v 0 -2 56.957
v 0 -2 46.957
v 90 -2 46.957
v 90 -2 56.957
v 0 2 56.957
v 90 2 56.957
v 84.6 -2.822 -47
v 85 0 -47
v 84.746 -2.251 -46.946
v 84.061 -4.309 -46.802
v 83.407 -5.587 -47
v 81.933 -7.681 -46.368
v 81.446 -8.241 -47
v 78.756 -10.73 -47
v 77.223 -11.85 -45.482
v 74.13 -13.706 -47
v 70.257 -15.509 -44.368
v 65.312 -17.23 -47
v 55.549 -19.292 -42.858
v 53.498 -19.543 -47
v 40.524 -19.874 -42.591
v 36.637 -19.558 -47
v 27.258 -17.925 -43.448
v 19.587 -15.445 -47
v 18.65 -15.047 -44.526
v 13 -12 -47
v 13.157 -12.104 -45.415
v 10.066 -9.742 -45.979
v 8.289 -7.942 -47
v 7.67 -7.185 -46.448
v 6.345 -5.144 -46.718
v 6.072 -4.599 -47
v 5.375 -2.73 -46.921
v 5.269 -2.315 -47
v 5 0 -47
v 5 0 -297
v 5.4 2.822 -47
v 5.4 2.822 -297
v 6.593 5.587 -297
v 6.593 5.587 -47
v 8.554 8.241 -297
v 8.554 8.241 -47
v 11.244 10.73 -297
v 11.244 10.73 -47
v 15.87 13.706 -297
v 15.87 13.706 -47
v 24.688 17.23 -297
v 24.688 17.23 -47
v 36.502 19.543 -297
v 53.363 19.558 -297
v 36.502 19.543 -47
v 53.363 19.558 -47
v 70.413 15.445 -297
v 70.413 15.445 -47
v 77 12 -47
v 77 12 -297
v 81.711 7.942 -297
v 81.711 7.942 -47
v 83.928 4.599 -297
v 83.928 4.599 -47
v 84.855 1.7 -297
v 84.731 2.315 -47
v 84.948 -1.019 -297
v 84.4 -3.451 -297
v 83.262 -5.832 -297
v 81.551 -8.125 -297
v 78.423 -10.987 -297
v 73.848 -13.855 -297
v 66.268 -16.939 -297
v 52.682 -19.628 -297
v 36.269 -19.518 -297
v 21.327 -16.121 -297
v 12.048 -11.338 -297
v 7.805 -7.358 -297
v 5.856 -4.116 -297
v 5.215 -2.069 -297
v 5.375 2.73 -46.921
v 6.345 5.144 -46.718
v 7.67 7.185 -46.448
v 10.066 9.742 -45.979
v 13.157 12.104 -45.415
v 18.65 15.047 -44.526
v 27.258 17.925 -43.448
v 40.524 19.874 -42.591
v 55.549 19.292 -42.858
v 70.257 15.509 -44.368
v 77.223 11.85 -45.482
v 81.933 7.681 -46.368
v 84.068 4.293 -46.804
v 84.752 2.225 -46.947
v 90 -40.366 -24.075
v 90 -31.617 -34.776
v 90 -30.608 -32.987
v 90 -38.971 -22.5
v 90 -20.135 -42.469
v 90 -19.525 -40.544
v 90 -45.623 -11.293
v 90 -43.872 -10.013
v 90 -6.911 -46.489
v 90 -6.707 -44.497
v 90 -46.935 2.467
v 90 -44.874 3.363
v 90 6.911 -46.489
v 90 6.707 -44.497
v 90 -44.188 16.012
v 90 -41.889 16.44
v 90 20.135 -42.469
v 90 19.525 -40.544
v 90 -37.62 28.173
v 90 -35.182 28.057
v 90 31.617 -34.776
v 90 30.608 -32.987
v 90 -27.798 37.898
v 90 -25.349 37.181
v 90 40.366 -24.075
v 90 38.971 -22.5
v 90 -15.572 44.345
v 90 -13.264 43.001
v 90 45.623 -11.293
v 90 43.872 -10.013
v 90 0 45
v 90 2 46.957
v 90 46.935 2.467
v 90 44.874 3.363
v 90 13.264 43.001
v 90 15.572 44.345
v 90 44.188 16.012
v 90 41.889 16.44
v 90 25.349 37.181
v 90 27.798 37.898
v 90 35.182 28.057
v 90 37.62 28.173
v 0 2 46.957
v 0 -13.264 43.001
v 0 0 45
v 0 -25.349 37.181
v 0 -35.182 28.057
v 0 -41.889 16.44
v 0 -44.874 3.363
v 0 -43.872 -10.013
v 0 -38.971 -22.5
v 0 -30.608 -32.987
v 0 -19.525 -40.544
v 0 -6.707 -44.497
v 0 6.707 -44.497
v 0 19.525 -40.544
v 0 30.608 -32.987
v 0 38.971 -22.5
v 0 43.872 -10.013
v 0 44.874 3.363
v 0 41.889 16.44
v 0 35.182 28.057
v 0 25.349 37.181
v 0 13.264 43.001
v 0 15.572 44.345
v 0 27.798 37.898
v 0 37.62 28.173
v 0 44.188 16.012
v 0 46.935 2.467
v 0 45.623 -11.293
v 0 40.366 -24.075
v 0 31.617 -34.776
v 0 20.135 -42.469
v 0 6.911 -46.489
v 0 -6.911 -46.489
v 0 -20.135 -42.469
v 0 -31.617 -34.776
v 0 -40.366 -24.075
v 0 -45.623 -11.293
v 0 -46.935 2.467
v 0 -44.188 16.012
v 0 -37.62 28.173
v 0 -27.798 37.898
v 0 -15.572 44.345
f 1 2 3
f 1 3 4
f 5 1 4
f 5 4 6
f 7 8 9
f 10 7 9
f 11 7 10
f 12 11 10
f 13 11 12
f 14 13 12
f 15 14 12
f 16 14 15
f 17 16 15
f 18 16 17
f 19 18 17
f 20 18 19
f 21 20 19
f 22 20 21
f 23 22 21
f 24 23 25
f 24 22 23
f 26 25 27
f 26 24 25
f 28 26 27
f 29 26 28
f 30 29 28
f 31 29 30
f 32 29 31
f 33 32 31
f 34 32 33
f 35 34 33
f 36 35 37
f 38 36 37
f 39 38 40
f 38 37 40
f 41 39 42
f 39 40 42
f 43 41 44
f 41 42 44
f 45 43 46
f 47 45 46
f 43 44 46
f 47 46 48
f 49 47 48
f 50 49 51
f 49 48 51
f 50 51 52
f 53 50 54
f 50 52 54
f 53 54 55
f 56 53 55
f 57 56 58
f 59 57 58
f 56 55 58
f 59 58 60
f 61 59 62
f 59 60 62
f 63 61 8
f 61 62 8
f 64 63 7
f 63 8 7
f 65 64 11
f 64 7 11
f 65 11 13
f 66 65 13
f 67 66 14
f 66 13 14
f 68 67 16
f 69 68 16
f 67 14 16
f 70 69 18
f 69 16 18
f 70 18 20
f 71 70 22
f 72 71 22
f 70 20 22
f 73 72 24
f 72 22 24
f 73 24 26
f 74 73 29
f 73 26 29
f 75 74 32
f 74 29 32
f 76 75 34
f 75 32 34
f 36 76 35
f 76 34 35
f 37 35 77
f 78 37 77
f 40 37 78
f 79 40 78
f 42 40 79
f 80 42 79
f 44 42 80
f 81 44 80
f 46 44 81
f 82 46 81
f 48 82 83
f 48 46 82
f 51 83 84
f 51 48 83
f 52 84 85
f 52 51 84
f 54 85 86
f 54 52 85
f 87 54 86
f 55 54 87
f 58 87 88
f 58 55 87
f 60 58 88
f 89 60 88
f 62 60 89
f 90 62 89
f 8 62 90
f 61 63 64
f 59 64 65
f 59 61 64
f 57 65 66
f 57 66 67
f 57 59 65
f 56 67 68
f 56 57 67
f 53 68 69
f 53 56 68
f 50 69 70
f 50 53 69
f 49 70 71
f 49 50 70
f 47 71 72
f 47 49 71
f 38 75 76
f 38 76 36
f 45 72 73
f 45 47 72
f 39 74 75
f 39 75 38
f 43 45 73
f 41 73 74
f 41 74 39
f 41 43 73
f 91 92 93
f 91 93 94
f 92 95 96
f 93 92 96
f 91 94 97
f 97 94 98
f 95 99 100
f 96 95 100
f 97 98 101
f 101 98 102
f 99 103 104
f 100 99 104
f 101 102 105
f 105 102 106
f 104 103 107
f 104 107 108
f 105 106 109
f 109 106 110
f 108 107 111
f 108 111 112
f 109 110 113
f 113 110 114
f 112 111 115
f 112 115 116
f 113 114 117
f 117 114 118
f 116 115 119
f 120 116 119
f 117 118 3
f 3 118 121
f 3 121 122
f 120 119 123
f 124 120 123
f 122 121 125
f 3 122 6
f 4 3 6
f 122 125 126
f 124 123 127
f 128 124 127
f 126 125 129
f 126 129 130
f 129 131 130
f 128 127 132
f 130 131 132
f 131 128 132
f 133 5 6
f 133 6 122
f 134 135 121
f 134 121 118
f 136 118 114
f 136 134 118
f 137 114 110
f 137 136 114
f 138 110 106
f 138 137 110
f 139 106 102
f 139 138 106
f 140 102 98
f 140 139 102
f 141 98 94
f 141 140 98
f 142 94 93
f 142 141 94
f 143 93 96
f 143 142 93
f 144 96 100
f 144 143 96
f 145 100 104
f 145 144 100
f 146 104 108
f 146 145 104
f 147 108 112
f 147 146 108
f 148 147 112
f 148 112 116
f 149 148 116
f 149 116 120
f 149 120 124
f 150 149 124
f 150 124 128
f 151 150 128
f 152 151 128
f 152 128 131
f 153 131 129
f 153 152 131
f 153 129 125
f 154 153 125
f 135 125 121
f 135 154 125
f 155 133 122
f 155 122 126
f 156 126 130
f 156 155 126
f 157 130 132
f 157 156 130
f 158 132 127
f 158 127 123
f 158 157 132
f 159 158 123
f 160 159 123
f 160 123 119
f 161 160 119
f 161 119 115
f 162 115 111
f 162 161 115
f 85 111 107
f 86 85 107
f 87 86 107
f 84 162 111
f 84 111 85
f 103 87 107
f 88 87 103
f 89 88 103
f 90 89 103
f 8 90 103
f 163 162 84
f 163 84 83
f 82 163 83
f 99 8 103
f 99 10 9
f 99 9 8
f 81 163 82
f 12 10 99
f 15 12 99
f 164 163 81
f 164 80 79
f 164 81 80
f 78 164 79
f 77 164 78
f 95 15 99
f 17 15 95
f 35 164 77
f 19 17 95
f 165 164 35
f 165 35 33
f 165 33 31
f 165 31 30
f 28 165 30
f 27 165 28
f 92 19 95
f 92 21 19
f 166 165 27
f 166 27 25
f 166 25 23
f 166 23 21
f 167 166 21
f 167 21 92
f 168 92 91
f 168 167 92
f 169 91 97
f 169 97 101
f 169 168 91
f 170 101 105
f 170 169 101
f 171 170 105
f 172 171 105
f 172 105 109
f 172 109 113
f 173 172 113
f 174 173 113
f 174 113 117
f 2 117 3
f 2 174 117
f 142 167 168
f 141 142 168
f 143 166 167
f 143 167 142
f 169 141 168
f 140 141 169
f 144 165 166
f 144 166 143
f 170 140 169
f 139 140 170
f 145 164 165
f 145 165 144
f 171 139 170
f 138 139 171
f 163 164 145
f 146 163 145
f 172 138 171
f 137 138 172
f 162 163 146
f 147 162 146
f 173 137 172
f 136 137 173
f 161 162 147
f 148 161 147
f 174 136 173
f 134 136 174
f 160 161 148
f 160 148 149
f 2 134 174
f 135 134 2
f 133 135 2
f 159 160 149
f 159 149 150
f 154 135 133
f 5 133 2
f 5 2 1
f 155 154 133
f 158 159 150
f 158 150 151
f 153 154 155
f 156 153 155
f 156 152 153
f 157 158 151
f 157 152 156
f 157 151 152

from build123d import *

# Parameters (mm, degrees)
CLASP_SKETCH_R                  = 45
CLASP_EXTRUDE_DEPTH             = 90
SHAFT_EXTRUDE_REACH             = 147.314
SHAFT_EXTRUDE_END_RADIUS        = 47
SHAFT_SKETCH_RX                 = 40
SHAFT_SKETCH_RY                 = 20
SHAFT_EXTRUDE_DIRECTION_2_DEPTH = 250


with BuildPart() as part:
    # Clasp Sketch → Clasp Extrude (new body)
    with BuildSketch(Plane(origin=(0, 0, 0), x_dir=(0, 0, -1), z_dir=(1, 0, 0))):
        with BuildLine():
            Line((-56.957427527, -2), (-56.957427527, 2))
            Line((-56.957427527, 2), (-46.957427527, 2))
            ThreePointArc((-46.957427527, 2), (47, 0), (-46.957427527, -2))
            Line((-46.957427527, -2), (-56.957427527, -2))
        make_face()
        Circle(CLASP_SKETCH_R, mode=Mode.SUBTRACT)
    extrude(amount=CLASP_EXTRUDE_DEPTH)

    # Shaft Extrude: up to this cylinder (the profile starts outside it)
    shaft_extrude_end = Plane(origin=(45, 0, 0), z_dir=(-1, 0, 0)) * Cylinder(SHAFT_EXTRUDE_END_RADIUS, 389.628, mode=Mode.PRIVATE)
    # Shaft Sketch → Shaft Extrude (add, up to the surface)
    with BuildSketch(Plane(origin=(0, 0, -47), x_dir=(-1, 0, 0), z_dir=(0, 0, -1)), mode=Mode.PRIVATE) as shaft_extrude_sk1:
        with Locations(Location((-45, 0), (0, 0, 0))):
            Ellipse(SHAFT_SKETCH_RX, SHAFT_SKETCH_RY)
    shaft_extrude_tool1 = extrude(shaft_extrude_sk1.sketch, amount=-SHAFT_EXTRUDE_REACH, mode=Mode.PRIVATE) - shaft_extrude_end
    add(shaft_extrude_tool1.solids().sort_by_distance((45, 0, -47))[0])
    add(shaft_extrude_tool1.solids().sort_by_distance((45, 0, -47))[1])

    # Shaft Sketch → Shaft Extrude direction 2 (add)
    with BuildSketch(Plane(origin=(0, 0, -47), x_dir=(-1, 0, 0), z_dir=(0, 0, -1))):
        with Locations(Location((-45, 0), (0, 0, 0))):
            Ellipse(SHAFT_SKETCH_RX, SHAFT_SKETCH_RY)
    extrude(amount=SHAFT_EXTRUDE_DIRECTION_2_DEPTH)


solid = part.part
